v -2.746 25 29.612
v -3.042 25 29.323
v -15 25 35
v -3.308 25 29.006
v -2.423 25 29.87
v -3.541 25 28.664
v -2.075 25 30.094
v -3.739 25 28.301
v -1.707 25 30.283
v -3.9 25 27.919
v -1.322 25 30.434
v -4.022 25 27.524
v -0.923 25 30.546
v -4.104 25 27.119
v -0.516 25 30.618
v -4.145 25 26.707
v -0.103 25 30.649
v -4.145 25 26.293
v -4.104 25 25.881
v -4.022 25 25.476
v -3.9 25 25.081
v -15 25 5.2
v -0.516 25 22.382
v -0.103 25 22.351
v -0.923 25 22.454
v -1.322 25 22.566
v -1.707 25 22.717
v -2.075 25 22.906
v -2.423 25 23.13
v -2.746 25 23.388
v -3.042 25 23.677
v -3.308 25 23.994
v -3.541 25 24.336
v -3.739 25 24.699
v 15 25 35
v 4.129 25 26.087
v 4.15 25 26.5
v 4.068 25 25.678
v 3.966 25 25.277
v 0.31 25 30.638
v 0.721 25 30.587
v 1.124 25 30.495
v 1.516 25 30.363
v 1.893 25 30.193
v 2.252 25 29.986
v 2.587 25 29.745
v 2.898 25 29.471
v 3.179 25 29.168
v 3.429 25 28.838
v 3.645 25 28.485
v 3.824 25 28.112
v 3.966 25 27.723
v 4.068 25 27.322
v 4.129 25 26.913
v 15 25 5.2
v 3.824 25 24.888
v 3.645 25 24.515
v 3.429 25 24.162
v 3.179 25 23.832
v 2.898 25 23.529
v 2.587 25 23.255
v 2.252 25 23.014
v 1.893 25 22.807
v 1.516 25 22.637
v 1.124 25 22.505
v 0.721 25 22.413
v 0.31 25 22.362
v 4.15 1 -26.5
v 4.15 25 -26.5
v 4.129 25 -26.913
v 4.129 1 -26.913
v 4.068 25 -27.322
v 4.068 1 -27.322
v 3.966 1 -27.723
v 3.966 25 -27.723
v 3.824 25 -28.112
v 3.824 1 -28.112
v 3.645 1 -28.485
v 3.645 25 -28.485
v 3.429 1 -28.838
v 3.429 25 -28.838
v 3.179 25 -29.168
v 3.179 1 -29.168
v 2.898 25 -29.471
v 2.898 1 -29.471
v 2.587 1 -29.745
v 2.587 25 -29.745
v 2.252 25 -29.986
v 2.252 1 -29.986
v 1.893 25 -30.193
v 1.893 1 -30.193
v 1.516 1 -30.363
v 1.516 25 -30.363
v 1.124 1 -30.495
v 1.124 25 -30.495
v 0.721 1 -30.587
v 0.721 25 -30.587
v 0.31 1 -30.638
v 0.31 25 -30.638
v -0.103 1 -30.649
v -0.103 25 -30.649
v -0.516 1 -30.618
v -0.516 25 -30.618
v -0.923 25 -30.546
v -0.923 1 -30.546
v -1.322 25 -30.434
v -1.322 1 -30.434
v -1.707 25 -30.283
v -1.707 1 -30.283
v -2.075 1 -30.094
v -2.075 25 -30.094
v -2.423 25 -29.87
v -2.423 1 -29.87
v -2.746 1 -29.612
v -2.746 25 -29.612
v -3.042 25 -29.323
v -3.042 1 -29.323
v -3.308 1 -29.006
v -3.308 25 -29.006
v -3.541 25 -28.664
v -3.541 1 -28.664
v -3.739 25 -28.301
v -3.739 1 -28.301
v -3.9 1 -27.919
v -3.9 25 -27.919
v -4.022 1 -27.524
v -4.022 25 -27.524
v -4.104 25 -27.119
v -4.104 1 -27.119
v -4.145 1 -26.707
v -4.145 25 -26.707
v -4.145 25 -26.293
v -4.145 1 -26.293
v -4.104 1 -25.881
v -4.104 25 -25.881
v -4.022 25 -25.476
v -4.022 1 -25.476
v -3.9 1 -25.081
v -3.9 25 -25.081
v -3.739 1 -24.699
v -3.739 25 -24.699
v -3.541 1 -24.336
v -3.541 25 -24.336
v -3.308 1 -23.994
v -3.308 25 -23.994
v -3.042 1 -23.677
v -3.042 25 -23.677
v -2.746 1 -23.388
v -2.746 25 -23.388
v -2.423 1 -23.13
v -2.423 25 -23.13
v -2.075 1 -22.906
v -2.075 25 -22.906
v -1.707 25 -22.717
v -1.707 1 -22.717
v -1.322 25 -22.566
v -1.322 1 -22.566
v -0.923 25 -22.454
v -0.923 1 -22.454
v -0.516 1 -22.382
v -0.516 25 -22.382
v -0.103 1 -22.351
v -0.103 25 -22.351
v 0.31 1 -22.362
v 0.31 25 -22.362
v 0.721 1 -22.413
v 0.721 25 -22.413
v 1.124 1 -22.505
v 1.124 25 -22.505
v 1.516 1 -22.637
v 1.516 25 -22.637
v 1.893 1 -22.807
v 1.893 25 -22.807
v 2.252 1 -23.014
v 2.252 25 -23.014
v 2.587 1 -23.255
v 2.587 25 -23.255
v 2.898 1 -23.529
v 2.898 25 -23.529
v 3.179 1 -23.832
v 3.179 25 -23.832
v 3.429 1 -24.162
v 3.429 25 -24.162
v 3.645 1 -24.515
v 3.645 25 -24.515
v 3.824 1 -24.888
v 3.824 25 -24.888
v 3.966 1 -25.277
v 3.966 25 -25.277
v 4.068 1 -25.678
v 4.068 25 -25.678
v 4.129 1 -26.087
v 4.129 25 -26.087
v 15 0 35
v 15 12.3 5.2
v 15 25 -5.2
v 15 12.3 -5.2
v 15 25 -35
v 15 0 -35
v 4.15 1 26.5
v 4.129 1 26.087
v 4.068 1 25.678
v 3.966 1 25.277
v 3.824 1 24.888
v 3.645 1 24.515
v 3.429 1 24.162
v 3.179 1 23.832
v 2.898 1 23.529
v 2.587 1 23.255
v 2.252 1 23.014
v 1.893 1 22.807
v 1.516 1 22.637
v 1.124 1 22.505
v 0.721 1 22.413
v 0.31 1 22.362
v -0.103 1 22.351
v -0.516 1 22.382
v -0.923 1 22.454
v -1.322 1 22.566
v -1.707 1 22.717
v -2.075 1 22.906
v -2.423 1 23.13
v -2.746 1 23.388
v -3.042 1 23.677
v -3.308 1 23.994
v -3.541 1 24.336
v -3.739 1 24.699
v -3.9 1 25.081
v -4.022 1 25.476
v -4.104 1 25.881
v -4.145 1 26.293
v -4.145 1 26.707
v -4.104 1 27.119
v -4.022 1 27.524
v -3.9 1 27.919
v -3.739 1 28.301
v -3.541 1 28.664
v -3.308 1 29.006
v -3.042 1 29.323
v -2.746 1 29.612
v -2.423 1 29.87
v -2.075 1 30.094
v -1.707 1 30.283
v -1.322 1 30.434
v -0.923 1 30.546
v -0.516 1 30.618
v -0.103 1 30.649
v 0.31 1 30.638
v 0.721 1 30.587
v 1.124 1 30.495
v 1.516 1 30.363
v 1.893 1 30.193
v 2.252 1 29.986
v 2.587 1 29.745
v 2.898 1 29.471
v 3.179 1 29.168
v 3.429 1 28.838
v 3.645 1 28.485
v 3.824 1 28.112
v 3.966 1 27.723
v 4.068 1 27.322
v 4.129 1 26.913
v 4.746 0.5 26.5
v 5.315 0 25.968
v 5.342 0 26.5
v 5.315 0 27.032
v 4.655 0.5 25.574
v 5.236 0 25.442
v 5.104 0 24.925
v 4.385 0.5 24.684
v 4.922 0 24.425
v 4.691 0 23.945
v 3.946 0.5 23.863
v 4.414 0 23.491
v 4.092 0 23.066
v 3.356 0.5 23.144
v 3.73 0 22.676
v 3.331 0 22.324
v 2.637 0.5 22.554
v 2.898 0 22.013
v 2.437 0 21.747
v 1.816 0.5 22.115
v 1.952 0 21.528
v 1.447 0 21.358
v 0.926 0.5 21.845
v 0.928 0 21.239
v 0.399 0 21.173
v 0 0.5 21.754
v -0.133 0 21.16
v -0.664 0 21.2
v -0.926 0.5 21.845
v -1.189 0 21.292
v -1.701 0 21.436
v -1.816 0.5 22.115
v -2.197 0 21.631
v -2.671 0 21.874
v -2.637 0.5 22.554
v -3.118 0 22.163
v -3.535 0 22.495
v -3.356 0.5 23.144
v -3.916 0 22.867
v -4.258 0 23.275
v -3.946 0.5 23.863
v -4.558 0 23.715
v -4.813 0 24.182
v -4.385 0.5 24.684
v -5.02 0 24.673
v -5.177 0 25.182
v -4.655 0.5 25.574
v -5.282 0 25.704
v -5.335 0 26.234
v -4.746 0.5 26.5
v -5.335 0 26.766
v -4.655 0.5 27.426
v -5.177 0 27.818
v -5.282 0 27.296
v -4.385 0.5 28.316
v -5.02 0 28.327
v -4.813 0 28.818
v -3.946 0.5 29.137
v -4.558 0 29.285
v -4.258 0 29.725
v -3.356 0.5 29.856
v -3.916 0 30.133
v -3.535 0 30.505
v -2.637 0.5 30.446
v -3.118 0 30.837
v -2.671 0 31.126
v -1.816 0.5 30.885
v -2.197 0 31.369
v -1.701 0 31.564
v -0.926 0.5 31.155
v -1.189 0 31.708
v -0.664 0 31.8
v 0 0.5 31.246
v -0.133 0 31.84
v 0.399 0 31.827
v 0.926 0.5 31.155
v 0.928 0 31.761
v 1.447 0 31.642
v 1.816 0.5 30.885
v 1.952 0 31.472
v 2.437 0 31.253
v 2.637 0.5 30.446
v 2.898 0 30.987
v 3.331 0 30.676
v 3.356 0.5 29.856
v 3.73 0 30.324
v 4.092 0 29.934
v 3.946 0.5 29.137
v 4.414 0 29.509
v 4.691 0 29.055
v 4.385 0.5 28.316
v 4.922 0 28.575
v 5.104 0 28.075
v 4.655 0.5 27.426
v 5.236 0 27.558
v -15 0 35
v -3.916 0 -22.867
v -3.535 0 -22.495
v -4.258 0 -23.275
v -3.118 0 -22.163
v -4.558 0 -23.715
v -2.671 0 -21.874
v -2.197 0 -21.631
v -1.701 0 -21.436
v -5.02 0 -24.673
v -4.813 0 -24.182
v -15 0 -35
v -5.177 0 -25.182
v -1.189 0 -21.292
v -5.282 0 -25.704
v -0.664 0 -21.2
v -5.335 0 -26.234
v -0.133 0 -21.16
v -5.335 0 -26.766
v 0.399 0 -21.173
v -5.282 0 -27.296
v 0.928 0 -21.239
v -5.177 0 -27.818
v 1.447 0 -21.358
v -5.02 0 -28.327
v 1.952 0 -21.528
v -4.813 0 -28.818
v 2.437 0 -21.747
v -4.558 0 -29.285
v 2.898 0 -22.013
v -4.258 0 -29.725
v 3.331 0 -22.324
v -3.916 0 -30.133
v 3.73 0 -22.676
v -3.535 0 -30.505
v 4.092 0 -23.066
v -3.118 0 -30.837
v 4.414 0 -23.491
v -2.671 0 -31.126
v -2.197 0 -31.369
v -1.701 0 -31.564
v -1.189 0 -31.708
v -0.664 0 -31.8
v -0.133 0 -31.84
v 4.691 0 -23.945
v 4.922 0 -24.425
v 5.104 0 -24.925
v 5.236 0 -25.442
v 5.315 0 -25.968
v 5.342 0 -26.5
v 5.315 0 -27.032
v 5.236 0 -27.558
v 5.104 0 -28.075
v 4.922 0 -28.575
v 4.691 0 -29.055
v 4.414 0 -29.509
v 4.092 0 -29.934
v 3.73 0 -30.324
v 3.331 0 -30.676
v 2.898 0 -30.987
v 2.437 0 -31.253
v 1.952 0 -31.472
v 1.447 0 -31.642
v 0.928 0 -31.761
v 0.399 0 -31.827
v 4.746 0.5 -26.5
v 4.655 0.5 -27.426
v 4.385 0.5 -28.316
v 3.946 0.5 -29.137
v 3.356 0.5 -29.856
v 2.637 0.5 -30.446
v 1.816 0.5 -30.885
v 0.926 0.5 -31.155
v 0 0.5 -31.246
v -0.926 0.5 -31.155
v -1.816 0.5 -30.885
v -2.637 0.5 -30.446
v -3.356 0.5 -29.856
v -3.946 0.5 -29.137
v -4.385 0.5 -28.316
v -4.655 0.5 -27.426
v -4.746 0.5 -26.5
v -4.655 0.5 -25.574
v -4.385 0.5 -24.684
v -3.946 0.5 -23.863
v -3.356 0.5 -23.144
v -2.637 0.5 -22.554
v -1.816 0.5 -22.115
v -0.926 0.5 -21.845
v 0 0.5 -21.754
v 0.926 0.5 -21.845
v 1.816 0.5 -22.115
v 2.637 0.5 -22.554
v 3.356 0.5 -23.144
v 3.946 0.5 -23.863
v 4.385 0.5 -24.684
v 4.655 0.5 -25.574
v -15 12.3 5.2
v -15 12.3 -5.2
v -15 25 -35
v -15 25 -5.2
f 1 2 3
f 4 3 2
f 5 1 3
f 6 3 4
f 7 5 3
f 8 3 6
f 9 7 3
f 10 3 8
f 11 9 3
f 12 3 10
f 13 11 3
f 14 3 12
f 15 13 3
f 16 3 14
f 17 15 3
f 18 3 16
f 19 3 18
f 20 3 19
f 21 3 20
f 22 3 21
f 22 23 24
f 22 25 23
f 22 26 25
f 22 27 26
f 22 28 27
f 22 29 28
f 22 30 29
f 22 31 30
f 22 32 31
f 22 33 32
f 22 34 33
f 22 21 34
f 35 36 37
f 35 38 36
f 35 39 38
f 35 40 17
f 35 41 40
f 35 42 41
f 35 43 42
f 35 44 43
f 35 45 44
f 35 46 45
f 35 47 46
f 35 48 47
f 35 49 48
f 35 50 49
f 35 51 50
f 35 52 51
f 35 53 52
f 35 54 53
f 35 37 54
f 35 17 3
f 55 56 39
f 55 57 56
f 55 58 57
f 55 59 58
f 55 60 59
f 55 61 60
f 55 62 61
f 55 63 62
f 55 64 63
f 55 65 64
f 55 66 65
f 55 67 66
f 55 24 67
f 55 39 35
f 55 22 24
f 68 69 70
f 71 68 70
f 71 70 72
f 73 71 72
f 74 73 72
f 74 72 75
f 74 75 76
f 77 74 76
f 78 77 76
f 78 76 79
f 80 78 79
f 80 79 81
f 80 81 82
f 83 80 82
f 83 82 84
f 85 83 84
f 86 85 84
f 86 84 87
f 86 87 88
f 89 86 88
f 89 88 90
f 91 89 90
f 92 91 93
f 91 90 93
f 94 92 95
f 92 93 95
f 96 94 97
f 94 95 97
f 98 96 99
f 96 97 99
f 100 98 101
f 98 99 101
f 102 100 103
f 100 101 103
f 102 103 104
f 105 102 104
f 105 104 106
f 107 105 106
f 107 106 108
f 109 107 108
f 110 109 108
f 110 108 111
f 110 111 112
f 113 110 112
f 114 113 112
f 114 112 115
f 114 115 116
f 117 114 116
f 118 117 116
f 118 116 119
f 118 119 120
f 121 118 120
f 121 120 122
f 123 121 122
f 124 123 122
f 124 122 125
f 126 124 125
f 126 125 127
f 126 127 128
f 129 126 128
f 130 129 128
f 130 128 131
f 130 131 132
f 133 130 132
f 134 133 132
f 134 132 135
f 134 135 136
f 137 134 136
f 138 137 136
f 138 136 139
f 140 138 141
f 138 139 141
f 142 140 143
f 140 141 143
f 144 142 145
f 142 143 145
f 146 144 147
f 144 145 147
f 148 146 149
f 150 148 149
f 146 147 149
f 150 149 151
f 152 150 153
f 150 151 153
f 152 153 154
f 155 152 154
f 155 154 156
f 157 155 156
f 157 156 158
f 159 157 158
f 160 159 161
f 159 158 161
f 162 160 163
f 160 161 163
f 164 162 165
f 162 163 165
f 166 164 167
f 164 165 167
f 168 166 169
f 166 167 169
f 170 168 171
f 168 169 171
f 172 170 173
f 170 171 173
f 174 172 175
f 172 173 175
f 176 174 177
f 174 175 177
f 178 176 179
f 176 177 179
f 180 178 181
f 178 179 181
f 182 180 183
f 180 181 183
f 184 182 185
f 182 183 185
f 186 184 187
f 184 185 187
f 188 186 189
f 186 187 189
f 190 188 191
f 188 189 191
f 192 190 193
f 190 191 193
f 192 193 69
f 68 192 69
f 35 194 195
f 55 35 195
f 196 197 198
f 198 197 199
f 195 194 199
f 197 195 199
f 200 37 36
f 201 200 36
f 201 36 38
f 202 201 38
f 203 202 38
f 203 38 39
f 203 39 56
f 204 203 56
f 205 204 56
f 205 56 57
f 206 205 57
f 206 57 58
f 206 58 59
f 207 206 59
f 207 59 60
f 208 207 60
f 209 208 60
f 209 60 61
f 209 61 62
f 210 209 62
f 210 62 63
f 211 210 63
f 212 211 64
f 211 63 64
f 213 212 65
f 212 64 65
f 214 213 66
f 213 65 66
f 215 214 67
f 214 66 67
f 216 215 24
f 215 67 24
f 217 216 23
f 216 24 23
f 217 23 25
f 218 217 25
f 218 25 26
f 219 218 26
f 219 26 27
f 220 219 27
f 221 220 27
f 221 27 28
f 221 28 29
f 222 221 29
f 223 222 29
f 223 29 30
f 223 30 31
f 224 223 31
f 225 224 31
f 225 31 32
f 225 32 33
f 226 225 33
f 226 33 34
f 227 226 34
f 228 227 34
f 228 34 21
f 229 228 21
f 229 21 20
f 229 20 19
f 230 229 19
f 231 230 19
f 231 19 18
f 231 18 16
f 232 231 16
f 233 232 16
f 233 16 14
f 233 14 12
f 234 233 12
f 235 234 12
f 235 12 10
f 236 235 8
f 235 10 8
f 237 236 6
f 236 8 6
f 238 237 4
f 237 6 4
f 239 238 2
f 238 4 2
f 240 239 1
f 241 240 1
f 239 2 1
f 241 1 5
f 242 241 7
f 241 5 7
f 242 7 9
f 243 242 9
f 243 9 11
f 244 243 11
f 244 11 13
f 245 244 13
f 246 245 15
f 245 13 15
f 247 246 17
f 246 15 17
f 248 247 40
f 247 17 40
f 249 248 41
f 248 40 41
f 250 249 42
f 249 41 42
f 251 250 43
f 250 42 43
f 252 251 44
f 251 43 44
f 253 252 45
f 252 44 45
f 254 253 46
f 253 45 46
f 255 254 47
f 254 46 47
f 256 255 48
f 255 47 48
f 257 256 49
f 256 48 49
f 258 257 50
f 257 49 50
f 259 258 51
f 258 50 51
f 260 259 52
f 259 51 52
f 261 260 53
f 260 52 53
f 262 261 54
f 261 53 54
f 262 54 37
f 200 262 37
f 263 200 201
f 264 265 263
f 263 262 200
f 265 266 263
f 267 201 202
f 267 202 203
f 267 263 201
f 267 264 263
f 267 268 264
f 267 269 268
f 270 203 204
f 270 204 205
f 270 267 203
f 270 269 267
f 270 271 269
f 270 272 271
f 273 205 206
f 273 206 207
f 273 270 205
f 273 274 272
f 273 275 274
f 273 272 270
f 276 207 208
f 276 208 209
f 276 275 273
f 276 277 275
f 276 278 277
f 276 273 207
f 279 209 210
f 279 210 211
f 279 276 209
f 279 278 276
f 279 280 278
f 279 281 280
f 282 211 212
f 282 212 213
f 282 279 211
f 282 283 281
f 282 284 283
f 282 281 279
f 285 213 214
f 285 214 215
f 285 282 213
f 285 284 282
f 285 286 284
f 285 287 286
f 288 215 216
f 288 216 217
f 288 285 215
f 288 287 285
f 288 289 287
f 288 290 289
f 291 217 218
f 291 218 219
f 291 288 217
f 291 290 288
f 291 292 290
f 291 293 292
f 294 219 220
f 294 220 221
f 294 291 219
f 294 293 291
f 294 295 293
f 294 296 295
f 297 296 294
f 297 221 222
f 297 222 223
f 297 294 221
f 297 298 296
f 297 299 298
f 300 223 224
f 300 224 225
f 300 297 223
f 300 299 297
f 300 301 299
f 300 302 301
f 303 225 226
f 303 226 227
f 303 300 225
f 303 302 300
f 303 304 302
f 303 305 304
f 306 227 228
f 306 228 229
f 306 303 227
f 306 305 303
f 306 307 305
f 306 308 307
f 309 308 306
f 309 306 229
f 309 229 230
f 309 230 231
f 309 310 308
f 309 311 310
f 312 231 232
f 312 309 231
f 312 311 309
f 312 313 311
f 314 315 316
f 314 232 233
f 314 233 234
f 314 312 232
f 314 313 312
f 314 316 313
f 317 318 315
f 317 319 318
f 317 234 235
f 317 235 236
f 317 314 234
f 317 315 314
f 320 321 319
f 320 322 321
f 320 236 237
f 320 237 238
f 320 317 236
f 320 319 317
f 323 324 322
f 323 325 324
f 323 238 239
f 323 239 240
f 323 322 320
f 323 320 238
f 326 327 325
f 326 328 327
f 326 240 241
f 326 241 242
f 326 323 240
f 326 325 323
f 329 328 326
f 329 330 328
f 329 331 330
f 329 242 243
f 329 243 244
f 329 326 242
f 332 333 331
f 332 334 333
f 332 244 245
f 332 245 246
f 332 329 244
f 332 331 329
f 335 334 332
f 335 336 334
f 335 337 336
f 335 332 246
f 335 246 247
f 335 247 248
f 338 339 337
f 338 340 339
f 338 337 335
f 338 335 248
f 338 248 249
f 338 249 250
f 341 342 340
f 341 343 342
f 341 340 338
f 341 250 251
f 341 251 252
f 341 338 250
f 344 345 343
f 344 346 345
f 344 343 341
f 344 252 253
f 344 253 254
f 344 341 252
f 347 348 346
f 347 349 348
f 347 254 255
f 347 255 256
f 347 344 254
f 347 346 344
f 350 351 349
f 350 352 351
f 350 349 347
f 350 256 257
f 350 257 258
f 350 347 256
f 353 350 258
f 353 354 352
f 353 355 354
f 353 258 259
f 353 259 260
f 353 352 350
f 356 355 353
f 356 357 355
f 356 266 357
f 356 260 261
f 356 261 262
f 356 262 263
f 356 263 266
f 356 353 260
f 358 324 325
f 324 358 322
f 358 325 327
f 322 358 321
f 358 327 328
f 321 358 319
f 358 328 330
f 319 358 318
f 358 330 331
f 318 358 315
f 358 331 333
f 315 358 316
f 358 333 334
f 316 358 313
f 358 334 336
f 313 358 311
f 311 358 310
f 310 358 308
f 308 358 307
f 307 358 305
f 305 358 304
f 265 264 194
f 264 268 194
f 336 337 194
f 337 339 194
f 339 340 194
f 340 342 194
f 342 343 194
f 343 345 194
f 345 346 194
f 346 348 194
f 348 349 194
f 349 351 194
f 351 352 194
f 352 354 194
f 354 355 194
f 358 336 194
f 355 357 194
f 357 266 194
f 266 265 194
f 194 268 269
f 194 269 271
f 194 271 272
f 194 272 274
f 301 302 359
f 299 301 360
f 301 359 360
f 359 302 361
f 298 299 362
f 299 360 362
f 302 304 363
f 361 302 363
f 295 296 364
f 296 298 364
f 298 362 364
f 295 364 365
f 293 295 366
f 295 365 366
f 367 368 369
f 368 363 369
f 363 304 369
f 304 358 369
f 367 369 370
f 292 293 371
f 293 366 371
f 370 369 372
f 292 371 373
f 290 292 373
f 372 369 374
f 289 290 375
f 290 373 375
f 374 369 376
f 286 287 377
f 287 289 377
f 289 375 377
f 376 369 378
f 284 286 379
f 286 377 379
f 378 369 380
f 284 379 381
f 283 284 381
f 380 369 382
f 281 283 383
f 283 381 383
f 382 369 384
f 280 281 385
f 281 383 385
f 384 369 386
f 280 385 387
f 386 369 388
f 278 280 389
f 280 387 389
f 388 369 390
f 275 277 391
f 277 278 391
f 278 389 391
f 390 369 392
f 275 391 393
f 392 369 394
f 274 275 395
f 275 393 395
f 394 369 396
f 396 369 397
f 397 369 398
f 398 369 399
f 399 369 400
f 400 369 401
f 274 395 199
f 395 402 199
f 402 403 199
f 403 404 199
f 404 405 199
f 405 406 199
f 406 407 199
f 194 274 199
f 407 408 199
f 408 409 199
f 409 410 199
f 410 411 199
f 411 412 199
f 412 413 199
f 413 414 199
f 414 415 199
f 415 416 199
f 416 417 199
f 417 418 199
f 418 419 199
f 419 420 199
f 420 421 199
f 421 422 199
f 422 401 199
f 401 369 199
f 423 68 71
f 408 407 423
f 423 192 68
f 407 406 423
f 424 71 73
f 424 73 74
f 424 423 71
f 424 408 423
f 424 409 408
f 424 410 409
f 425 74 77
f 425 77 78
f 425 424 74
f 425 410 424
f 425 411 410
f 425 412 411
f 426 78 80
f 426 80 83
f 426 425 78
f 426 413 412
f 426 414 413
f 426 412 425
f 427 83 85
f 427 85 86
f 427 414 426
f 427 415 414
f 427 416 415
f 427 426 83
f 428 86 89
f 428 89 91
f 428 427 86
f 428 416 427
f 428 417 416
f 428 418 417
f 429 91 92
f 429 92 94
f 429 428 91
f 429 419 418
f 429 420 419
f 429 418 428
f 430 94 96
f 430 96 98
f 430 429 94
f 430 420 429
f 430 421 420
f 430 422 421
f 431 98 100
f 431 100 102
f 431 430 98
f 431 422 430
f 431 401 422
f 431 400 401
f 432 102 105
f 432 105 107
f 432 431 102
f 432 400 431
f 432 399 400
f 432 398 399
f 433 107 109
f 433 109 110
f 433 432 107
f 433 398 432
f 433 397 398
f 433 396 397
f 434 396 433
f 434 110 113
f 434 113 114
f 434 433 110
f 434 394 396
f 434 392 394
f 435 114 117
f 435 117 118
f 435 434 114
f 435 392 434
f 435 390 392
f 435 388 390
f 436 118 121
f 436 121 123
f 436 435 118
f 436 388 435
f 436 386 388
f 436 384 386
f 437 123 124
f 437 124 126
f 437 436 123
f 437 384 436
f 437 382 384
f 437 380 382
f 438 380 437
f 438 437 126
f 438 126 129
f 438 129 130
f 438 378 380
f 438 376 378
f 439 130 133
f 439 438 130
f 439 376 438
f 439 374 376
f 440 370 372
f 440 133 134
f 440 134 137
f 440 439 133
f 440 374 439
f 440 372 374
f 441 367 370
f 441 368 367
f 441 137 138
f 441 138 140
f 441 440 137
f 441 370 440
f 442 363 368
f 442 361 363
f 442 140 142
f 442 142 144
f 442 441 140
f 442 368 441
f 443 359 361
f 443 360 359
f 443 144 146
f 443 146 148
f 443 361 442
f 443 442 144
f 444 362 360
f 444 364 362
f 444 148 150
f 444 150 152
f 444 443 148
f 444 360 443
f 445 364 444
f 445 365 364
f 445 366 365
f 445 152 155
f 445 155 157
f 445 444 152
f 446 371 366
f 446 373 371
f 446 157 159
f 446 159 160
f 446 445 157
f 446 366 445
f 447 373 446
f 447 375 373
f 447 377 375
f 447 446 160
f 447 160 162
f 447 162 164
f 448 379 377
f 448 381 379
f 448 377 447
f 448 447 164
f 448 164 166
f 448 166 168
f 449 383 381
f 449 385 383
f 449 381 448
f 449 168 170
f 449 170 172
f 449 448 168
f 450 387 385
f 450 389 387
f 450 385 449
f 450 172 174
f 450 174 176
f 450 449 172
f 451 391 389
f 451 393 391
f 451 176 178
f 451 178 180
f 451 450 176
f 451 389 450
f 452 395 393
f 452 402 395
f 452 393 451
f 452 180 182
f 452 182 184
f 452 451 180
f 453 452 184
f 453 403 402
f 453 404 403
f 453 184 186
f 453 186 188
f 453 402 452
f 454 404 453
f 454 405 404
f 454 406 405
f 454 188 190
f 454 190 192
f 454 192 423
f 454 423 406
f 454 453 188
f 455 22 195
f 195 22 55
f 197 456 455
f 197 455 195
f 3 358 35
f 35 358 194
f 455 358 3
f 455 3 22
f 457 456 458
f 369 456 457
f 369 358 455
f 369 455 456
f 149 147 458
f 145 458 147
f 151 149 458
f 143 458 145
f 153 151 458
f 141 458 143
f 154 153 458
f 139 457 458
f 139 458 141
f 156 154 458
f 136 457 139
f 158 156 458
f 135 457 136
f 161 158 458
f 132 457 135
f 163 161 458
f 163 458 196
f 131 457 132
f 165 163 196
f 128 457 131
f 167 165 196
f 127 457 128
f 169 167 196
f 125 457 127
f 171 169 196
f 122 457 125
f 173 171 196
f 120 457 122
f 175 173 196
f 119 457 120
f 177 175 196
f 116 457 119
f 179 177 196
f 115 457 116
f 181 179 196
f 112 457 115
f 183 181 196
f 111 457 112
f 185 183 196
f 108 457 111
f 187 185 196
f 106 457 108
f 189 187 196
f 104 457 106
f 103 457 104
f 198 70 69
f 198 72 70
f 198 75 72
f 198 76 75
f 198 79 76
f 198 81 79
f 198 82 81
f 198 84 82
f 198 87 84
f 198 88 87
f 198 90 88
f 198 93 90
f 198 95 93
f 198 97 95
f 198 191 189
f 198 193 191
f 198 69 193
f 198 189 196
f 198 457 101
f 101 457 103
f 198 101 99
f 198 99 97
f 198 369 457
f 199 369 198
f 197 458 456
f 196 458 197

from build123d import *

# Parameters (mm, degrees)
SKETCH1_W             = 30
SKETCH1_H             = 70
BOSS_EXTRUDE1_DEPTH   = 25
SKETCH2_W             = 30
SKETCH2_H             = 10.4
CUT_EXTRUDE1_DEPTH    = 12.7
SKETCH3_R             = 4.15
CUT_EXTRUDE2_DEPTH    = 26
CHAMFER1_SIZE         = 1
CHAMFER1_SIZE2        = 1.191753593
CHAMFER1_PART_2_SIZE  = 1
CHAMFER1_PART_2_SIZE2 = 1.191753593


with BuildPart() as part:
    # Sketch1 → Boss-Extrude1 (new body)
    with BuildSketch(Plane(origin=(0, 0, 0), x_dir=(1, 0, 0), z_dir=(0, 1, 0))):
        Rectangle(SKETCH1_W, SKETCH1_H)
    extrude(amount=BOSS_EXTRUDE1_DEPTH)

    # Sketch2 → Cut-Extrude1 (cut)
    with BuildSketch(Plane(origin=(0, 25, 0), x_dir=(1, 0, 0), z_dir=(0, 1, 0))):
        Rectangle(SKETCH2_W, SKETCH2_H)
    extrude(amount=-CUT_EXTRUDE1_DEPTH, mode=Mode.SUBTRACT)

    # Sketch3 → Cut-Extrude2 (cut, through all)
    with BuildSketch(Plane(origin=(0, 25, 0), x_dir=(1, 0, 0), z_dir=(0, 1, 0))):
        with Locations((0, 26.5)):
            Circle(SKETCH3_R)
        with Locations((0, -26.5)):
            Circle(SKETCH3_R)
    extrude(amount=-CUT_EXTRUDE2_DEPTH, mode=Mode.SUBTRACT)

    # Chamfer1
    chamfer1_edges = [part.edges().sort_by_distance(p)[0] for p in [
        (-4.15, 0, -26.5),
    ]]
    chamfer1_side = [part.faces().sort_by_distance(p)[0] for p in [
        (-4.15, 12.5, -26.5),
    ]]
    chamfer(chamfer1_edges, length=CHAMFER1_SIZE, length2=CHAMFER1_SIZE2, reference=chamfer1_side[0])

    # Chamfer1 part 2
    chamfer1_part_2_edges = [part.edges().sort_by_distance(p)[0] for p in [
        (-4.15, 0, 26.5),
    ]]
    chamfer1_part_2_side = [part.faces().sort_by_distance(p)[0] for p in [
        (-4.15, 12.5, 26.5),
    ]]
    chamfer(chamfer1_part_2_edges, length=CHAMFER1_PART_2_SIZE, length2=CHAMFER1_PART_2_SIZE2, reference=chamfer1_part_2_side[0])


solid = part.part
